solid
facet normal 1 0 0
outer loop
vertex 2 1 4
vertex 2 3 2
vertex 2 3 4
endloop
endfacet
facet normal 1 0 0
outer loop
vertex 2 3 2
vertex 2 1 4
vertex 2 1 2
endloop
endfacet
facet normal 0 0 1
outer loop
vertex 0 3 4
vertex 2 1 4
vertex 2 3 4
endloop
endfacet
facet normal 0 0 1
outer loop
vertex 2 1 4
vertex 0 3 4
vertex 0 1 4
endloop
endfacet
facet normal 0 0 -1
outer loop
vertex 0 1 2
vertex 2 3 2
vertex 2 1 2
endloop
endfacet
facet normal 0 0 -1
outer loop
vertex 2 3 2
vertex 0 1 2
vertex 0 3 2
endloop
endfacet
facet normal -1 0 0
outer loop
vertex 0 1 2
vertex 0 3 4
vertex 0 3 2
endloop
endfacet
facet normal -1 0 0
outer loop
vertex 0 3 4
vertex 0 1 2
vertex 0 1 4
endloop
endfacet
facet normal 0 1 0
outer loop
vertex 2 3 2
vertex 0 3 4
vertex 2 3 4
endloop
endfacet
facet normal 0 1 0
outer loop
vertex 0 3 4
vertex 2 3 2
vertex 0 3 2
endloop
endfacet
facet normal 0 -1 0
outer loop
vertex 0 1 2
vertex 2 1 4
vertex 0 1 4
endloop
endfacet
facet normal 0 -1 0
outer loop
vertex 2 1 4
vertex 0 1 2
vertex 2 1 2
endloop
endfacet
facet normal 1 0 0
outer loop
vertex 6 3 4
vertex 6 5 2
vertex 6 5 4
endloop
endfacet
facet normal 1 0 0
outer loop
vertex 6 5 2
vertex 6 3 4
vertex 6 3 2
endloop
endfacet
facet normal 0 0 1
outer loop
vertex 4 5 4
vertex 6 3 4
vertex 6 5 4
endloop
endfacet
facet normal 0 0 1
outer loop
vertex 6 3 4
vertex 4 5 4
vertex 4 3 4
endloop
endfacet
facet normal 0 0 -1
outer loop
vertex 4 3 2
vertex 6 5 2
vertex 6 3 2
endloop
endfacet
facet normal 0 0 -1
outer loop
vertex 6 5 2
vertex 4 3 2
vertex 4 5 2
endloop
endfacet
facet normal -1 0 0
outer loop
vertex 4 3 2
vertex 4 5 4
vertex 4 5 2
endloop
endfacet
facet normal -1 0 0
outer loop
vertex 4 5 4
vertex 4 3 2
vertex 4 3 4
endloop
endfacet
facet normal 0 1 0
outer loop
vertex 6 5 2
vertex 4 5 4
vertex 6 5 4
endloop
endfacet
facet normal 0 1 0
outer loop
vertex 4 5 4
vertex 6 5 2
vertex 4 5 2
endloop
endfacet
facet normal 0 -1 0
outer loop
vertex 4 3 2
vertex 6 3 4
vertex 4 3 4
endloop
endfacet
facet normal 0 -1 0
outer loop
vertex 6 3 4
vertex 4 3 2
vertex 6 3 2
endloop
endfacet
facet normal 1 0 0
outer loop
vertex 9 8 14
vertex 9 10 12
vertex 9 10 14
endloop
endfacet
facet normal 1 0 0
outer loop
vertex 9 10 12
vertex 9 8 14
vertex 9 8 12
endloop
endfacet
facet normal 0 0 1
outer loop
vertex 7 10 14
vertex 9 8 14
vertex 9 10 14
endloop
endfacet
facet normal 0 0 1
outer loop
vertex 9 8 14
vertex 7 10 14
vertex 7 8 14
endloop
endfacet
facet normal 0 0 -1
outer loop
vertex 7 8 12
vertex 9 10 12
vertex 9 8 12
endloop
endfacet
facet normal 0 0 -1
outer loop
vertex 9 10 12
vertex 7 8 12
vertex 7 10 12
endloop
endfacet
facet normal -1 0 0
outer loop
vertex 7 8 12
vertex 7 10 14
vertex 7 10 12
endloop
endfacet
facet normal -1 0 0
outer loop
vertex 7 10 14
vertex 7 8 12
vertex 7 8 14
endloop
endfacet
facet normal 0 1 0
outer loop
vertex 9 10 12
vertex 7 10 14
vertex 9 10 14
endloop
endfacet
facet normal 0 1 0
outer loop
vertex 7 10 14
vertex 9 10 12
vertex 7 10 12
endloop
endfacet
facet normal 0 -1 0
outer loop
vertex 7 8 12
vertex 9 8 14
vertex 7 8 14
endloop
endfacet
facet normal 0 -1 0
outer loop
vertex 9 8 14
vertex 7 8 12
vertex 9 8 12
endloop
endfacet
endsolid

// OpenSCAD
my_list = [1, 2, 3, 4, 5, true, false, "hello"];
echo(my_list);

second = [5, 4, 20, 10];

echo(len(second));
echo(second[3]);
/*
test_list = [4, 5, 6];

translate(test_list)
cube(size = 2, center =  true);
*/

vectors = [
[1, 2, 3],
[5, 4, 3],
[8, 9, 13]
];
/*
for(v=vectors){
        translate(v)
        cube(size = 2, center =  true);
    }
    */  
for(c=[0:len(vectors) - 1]){
        translate(vectors[c])
        cube(size = 2, center =  true);
    }
    
    
    
    
    
    
